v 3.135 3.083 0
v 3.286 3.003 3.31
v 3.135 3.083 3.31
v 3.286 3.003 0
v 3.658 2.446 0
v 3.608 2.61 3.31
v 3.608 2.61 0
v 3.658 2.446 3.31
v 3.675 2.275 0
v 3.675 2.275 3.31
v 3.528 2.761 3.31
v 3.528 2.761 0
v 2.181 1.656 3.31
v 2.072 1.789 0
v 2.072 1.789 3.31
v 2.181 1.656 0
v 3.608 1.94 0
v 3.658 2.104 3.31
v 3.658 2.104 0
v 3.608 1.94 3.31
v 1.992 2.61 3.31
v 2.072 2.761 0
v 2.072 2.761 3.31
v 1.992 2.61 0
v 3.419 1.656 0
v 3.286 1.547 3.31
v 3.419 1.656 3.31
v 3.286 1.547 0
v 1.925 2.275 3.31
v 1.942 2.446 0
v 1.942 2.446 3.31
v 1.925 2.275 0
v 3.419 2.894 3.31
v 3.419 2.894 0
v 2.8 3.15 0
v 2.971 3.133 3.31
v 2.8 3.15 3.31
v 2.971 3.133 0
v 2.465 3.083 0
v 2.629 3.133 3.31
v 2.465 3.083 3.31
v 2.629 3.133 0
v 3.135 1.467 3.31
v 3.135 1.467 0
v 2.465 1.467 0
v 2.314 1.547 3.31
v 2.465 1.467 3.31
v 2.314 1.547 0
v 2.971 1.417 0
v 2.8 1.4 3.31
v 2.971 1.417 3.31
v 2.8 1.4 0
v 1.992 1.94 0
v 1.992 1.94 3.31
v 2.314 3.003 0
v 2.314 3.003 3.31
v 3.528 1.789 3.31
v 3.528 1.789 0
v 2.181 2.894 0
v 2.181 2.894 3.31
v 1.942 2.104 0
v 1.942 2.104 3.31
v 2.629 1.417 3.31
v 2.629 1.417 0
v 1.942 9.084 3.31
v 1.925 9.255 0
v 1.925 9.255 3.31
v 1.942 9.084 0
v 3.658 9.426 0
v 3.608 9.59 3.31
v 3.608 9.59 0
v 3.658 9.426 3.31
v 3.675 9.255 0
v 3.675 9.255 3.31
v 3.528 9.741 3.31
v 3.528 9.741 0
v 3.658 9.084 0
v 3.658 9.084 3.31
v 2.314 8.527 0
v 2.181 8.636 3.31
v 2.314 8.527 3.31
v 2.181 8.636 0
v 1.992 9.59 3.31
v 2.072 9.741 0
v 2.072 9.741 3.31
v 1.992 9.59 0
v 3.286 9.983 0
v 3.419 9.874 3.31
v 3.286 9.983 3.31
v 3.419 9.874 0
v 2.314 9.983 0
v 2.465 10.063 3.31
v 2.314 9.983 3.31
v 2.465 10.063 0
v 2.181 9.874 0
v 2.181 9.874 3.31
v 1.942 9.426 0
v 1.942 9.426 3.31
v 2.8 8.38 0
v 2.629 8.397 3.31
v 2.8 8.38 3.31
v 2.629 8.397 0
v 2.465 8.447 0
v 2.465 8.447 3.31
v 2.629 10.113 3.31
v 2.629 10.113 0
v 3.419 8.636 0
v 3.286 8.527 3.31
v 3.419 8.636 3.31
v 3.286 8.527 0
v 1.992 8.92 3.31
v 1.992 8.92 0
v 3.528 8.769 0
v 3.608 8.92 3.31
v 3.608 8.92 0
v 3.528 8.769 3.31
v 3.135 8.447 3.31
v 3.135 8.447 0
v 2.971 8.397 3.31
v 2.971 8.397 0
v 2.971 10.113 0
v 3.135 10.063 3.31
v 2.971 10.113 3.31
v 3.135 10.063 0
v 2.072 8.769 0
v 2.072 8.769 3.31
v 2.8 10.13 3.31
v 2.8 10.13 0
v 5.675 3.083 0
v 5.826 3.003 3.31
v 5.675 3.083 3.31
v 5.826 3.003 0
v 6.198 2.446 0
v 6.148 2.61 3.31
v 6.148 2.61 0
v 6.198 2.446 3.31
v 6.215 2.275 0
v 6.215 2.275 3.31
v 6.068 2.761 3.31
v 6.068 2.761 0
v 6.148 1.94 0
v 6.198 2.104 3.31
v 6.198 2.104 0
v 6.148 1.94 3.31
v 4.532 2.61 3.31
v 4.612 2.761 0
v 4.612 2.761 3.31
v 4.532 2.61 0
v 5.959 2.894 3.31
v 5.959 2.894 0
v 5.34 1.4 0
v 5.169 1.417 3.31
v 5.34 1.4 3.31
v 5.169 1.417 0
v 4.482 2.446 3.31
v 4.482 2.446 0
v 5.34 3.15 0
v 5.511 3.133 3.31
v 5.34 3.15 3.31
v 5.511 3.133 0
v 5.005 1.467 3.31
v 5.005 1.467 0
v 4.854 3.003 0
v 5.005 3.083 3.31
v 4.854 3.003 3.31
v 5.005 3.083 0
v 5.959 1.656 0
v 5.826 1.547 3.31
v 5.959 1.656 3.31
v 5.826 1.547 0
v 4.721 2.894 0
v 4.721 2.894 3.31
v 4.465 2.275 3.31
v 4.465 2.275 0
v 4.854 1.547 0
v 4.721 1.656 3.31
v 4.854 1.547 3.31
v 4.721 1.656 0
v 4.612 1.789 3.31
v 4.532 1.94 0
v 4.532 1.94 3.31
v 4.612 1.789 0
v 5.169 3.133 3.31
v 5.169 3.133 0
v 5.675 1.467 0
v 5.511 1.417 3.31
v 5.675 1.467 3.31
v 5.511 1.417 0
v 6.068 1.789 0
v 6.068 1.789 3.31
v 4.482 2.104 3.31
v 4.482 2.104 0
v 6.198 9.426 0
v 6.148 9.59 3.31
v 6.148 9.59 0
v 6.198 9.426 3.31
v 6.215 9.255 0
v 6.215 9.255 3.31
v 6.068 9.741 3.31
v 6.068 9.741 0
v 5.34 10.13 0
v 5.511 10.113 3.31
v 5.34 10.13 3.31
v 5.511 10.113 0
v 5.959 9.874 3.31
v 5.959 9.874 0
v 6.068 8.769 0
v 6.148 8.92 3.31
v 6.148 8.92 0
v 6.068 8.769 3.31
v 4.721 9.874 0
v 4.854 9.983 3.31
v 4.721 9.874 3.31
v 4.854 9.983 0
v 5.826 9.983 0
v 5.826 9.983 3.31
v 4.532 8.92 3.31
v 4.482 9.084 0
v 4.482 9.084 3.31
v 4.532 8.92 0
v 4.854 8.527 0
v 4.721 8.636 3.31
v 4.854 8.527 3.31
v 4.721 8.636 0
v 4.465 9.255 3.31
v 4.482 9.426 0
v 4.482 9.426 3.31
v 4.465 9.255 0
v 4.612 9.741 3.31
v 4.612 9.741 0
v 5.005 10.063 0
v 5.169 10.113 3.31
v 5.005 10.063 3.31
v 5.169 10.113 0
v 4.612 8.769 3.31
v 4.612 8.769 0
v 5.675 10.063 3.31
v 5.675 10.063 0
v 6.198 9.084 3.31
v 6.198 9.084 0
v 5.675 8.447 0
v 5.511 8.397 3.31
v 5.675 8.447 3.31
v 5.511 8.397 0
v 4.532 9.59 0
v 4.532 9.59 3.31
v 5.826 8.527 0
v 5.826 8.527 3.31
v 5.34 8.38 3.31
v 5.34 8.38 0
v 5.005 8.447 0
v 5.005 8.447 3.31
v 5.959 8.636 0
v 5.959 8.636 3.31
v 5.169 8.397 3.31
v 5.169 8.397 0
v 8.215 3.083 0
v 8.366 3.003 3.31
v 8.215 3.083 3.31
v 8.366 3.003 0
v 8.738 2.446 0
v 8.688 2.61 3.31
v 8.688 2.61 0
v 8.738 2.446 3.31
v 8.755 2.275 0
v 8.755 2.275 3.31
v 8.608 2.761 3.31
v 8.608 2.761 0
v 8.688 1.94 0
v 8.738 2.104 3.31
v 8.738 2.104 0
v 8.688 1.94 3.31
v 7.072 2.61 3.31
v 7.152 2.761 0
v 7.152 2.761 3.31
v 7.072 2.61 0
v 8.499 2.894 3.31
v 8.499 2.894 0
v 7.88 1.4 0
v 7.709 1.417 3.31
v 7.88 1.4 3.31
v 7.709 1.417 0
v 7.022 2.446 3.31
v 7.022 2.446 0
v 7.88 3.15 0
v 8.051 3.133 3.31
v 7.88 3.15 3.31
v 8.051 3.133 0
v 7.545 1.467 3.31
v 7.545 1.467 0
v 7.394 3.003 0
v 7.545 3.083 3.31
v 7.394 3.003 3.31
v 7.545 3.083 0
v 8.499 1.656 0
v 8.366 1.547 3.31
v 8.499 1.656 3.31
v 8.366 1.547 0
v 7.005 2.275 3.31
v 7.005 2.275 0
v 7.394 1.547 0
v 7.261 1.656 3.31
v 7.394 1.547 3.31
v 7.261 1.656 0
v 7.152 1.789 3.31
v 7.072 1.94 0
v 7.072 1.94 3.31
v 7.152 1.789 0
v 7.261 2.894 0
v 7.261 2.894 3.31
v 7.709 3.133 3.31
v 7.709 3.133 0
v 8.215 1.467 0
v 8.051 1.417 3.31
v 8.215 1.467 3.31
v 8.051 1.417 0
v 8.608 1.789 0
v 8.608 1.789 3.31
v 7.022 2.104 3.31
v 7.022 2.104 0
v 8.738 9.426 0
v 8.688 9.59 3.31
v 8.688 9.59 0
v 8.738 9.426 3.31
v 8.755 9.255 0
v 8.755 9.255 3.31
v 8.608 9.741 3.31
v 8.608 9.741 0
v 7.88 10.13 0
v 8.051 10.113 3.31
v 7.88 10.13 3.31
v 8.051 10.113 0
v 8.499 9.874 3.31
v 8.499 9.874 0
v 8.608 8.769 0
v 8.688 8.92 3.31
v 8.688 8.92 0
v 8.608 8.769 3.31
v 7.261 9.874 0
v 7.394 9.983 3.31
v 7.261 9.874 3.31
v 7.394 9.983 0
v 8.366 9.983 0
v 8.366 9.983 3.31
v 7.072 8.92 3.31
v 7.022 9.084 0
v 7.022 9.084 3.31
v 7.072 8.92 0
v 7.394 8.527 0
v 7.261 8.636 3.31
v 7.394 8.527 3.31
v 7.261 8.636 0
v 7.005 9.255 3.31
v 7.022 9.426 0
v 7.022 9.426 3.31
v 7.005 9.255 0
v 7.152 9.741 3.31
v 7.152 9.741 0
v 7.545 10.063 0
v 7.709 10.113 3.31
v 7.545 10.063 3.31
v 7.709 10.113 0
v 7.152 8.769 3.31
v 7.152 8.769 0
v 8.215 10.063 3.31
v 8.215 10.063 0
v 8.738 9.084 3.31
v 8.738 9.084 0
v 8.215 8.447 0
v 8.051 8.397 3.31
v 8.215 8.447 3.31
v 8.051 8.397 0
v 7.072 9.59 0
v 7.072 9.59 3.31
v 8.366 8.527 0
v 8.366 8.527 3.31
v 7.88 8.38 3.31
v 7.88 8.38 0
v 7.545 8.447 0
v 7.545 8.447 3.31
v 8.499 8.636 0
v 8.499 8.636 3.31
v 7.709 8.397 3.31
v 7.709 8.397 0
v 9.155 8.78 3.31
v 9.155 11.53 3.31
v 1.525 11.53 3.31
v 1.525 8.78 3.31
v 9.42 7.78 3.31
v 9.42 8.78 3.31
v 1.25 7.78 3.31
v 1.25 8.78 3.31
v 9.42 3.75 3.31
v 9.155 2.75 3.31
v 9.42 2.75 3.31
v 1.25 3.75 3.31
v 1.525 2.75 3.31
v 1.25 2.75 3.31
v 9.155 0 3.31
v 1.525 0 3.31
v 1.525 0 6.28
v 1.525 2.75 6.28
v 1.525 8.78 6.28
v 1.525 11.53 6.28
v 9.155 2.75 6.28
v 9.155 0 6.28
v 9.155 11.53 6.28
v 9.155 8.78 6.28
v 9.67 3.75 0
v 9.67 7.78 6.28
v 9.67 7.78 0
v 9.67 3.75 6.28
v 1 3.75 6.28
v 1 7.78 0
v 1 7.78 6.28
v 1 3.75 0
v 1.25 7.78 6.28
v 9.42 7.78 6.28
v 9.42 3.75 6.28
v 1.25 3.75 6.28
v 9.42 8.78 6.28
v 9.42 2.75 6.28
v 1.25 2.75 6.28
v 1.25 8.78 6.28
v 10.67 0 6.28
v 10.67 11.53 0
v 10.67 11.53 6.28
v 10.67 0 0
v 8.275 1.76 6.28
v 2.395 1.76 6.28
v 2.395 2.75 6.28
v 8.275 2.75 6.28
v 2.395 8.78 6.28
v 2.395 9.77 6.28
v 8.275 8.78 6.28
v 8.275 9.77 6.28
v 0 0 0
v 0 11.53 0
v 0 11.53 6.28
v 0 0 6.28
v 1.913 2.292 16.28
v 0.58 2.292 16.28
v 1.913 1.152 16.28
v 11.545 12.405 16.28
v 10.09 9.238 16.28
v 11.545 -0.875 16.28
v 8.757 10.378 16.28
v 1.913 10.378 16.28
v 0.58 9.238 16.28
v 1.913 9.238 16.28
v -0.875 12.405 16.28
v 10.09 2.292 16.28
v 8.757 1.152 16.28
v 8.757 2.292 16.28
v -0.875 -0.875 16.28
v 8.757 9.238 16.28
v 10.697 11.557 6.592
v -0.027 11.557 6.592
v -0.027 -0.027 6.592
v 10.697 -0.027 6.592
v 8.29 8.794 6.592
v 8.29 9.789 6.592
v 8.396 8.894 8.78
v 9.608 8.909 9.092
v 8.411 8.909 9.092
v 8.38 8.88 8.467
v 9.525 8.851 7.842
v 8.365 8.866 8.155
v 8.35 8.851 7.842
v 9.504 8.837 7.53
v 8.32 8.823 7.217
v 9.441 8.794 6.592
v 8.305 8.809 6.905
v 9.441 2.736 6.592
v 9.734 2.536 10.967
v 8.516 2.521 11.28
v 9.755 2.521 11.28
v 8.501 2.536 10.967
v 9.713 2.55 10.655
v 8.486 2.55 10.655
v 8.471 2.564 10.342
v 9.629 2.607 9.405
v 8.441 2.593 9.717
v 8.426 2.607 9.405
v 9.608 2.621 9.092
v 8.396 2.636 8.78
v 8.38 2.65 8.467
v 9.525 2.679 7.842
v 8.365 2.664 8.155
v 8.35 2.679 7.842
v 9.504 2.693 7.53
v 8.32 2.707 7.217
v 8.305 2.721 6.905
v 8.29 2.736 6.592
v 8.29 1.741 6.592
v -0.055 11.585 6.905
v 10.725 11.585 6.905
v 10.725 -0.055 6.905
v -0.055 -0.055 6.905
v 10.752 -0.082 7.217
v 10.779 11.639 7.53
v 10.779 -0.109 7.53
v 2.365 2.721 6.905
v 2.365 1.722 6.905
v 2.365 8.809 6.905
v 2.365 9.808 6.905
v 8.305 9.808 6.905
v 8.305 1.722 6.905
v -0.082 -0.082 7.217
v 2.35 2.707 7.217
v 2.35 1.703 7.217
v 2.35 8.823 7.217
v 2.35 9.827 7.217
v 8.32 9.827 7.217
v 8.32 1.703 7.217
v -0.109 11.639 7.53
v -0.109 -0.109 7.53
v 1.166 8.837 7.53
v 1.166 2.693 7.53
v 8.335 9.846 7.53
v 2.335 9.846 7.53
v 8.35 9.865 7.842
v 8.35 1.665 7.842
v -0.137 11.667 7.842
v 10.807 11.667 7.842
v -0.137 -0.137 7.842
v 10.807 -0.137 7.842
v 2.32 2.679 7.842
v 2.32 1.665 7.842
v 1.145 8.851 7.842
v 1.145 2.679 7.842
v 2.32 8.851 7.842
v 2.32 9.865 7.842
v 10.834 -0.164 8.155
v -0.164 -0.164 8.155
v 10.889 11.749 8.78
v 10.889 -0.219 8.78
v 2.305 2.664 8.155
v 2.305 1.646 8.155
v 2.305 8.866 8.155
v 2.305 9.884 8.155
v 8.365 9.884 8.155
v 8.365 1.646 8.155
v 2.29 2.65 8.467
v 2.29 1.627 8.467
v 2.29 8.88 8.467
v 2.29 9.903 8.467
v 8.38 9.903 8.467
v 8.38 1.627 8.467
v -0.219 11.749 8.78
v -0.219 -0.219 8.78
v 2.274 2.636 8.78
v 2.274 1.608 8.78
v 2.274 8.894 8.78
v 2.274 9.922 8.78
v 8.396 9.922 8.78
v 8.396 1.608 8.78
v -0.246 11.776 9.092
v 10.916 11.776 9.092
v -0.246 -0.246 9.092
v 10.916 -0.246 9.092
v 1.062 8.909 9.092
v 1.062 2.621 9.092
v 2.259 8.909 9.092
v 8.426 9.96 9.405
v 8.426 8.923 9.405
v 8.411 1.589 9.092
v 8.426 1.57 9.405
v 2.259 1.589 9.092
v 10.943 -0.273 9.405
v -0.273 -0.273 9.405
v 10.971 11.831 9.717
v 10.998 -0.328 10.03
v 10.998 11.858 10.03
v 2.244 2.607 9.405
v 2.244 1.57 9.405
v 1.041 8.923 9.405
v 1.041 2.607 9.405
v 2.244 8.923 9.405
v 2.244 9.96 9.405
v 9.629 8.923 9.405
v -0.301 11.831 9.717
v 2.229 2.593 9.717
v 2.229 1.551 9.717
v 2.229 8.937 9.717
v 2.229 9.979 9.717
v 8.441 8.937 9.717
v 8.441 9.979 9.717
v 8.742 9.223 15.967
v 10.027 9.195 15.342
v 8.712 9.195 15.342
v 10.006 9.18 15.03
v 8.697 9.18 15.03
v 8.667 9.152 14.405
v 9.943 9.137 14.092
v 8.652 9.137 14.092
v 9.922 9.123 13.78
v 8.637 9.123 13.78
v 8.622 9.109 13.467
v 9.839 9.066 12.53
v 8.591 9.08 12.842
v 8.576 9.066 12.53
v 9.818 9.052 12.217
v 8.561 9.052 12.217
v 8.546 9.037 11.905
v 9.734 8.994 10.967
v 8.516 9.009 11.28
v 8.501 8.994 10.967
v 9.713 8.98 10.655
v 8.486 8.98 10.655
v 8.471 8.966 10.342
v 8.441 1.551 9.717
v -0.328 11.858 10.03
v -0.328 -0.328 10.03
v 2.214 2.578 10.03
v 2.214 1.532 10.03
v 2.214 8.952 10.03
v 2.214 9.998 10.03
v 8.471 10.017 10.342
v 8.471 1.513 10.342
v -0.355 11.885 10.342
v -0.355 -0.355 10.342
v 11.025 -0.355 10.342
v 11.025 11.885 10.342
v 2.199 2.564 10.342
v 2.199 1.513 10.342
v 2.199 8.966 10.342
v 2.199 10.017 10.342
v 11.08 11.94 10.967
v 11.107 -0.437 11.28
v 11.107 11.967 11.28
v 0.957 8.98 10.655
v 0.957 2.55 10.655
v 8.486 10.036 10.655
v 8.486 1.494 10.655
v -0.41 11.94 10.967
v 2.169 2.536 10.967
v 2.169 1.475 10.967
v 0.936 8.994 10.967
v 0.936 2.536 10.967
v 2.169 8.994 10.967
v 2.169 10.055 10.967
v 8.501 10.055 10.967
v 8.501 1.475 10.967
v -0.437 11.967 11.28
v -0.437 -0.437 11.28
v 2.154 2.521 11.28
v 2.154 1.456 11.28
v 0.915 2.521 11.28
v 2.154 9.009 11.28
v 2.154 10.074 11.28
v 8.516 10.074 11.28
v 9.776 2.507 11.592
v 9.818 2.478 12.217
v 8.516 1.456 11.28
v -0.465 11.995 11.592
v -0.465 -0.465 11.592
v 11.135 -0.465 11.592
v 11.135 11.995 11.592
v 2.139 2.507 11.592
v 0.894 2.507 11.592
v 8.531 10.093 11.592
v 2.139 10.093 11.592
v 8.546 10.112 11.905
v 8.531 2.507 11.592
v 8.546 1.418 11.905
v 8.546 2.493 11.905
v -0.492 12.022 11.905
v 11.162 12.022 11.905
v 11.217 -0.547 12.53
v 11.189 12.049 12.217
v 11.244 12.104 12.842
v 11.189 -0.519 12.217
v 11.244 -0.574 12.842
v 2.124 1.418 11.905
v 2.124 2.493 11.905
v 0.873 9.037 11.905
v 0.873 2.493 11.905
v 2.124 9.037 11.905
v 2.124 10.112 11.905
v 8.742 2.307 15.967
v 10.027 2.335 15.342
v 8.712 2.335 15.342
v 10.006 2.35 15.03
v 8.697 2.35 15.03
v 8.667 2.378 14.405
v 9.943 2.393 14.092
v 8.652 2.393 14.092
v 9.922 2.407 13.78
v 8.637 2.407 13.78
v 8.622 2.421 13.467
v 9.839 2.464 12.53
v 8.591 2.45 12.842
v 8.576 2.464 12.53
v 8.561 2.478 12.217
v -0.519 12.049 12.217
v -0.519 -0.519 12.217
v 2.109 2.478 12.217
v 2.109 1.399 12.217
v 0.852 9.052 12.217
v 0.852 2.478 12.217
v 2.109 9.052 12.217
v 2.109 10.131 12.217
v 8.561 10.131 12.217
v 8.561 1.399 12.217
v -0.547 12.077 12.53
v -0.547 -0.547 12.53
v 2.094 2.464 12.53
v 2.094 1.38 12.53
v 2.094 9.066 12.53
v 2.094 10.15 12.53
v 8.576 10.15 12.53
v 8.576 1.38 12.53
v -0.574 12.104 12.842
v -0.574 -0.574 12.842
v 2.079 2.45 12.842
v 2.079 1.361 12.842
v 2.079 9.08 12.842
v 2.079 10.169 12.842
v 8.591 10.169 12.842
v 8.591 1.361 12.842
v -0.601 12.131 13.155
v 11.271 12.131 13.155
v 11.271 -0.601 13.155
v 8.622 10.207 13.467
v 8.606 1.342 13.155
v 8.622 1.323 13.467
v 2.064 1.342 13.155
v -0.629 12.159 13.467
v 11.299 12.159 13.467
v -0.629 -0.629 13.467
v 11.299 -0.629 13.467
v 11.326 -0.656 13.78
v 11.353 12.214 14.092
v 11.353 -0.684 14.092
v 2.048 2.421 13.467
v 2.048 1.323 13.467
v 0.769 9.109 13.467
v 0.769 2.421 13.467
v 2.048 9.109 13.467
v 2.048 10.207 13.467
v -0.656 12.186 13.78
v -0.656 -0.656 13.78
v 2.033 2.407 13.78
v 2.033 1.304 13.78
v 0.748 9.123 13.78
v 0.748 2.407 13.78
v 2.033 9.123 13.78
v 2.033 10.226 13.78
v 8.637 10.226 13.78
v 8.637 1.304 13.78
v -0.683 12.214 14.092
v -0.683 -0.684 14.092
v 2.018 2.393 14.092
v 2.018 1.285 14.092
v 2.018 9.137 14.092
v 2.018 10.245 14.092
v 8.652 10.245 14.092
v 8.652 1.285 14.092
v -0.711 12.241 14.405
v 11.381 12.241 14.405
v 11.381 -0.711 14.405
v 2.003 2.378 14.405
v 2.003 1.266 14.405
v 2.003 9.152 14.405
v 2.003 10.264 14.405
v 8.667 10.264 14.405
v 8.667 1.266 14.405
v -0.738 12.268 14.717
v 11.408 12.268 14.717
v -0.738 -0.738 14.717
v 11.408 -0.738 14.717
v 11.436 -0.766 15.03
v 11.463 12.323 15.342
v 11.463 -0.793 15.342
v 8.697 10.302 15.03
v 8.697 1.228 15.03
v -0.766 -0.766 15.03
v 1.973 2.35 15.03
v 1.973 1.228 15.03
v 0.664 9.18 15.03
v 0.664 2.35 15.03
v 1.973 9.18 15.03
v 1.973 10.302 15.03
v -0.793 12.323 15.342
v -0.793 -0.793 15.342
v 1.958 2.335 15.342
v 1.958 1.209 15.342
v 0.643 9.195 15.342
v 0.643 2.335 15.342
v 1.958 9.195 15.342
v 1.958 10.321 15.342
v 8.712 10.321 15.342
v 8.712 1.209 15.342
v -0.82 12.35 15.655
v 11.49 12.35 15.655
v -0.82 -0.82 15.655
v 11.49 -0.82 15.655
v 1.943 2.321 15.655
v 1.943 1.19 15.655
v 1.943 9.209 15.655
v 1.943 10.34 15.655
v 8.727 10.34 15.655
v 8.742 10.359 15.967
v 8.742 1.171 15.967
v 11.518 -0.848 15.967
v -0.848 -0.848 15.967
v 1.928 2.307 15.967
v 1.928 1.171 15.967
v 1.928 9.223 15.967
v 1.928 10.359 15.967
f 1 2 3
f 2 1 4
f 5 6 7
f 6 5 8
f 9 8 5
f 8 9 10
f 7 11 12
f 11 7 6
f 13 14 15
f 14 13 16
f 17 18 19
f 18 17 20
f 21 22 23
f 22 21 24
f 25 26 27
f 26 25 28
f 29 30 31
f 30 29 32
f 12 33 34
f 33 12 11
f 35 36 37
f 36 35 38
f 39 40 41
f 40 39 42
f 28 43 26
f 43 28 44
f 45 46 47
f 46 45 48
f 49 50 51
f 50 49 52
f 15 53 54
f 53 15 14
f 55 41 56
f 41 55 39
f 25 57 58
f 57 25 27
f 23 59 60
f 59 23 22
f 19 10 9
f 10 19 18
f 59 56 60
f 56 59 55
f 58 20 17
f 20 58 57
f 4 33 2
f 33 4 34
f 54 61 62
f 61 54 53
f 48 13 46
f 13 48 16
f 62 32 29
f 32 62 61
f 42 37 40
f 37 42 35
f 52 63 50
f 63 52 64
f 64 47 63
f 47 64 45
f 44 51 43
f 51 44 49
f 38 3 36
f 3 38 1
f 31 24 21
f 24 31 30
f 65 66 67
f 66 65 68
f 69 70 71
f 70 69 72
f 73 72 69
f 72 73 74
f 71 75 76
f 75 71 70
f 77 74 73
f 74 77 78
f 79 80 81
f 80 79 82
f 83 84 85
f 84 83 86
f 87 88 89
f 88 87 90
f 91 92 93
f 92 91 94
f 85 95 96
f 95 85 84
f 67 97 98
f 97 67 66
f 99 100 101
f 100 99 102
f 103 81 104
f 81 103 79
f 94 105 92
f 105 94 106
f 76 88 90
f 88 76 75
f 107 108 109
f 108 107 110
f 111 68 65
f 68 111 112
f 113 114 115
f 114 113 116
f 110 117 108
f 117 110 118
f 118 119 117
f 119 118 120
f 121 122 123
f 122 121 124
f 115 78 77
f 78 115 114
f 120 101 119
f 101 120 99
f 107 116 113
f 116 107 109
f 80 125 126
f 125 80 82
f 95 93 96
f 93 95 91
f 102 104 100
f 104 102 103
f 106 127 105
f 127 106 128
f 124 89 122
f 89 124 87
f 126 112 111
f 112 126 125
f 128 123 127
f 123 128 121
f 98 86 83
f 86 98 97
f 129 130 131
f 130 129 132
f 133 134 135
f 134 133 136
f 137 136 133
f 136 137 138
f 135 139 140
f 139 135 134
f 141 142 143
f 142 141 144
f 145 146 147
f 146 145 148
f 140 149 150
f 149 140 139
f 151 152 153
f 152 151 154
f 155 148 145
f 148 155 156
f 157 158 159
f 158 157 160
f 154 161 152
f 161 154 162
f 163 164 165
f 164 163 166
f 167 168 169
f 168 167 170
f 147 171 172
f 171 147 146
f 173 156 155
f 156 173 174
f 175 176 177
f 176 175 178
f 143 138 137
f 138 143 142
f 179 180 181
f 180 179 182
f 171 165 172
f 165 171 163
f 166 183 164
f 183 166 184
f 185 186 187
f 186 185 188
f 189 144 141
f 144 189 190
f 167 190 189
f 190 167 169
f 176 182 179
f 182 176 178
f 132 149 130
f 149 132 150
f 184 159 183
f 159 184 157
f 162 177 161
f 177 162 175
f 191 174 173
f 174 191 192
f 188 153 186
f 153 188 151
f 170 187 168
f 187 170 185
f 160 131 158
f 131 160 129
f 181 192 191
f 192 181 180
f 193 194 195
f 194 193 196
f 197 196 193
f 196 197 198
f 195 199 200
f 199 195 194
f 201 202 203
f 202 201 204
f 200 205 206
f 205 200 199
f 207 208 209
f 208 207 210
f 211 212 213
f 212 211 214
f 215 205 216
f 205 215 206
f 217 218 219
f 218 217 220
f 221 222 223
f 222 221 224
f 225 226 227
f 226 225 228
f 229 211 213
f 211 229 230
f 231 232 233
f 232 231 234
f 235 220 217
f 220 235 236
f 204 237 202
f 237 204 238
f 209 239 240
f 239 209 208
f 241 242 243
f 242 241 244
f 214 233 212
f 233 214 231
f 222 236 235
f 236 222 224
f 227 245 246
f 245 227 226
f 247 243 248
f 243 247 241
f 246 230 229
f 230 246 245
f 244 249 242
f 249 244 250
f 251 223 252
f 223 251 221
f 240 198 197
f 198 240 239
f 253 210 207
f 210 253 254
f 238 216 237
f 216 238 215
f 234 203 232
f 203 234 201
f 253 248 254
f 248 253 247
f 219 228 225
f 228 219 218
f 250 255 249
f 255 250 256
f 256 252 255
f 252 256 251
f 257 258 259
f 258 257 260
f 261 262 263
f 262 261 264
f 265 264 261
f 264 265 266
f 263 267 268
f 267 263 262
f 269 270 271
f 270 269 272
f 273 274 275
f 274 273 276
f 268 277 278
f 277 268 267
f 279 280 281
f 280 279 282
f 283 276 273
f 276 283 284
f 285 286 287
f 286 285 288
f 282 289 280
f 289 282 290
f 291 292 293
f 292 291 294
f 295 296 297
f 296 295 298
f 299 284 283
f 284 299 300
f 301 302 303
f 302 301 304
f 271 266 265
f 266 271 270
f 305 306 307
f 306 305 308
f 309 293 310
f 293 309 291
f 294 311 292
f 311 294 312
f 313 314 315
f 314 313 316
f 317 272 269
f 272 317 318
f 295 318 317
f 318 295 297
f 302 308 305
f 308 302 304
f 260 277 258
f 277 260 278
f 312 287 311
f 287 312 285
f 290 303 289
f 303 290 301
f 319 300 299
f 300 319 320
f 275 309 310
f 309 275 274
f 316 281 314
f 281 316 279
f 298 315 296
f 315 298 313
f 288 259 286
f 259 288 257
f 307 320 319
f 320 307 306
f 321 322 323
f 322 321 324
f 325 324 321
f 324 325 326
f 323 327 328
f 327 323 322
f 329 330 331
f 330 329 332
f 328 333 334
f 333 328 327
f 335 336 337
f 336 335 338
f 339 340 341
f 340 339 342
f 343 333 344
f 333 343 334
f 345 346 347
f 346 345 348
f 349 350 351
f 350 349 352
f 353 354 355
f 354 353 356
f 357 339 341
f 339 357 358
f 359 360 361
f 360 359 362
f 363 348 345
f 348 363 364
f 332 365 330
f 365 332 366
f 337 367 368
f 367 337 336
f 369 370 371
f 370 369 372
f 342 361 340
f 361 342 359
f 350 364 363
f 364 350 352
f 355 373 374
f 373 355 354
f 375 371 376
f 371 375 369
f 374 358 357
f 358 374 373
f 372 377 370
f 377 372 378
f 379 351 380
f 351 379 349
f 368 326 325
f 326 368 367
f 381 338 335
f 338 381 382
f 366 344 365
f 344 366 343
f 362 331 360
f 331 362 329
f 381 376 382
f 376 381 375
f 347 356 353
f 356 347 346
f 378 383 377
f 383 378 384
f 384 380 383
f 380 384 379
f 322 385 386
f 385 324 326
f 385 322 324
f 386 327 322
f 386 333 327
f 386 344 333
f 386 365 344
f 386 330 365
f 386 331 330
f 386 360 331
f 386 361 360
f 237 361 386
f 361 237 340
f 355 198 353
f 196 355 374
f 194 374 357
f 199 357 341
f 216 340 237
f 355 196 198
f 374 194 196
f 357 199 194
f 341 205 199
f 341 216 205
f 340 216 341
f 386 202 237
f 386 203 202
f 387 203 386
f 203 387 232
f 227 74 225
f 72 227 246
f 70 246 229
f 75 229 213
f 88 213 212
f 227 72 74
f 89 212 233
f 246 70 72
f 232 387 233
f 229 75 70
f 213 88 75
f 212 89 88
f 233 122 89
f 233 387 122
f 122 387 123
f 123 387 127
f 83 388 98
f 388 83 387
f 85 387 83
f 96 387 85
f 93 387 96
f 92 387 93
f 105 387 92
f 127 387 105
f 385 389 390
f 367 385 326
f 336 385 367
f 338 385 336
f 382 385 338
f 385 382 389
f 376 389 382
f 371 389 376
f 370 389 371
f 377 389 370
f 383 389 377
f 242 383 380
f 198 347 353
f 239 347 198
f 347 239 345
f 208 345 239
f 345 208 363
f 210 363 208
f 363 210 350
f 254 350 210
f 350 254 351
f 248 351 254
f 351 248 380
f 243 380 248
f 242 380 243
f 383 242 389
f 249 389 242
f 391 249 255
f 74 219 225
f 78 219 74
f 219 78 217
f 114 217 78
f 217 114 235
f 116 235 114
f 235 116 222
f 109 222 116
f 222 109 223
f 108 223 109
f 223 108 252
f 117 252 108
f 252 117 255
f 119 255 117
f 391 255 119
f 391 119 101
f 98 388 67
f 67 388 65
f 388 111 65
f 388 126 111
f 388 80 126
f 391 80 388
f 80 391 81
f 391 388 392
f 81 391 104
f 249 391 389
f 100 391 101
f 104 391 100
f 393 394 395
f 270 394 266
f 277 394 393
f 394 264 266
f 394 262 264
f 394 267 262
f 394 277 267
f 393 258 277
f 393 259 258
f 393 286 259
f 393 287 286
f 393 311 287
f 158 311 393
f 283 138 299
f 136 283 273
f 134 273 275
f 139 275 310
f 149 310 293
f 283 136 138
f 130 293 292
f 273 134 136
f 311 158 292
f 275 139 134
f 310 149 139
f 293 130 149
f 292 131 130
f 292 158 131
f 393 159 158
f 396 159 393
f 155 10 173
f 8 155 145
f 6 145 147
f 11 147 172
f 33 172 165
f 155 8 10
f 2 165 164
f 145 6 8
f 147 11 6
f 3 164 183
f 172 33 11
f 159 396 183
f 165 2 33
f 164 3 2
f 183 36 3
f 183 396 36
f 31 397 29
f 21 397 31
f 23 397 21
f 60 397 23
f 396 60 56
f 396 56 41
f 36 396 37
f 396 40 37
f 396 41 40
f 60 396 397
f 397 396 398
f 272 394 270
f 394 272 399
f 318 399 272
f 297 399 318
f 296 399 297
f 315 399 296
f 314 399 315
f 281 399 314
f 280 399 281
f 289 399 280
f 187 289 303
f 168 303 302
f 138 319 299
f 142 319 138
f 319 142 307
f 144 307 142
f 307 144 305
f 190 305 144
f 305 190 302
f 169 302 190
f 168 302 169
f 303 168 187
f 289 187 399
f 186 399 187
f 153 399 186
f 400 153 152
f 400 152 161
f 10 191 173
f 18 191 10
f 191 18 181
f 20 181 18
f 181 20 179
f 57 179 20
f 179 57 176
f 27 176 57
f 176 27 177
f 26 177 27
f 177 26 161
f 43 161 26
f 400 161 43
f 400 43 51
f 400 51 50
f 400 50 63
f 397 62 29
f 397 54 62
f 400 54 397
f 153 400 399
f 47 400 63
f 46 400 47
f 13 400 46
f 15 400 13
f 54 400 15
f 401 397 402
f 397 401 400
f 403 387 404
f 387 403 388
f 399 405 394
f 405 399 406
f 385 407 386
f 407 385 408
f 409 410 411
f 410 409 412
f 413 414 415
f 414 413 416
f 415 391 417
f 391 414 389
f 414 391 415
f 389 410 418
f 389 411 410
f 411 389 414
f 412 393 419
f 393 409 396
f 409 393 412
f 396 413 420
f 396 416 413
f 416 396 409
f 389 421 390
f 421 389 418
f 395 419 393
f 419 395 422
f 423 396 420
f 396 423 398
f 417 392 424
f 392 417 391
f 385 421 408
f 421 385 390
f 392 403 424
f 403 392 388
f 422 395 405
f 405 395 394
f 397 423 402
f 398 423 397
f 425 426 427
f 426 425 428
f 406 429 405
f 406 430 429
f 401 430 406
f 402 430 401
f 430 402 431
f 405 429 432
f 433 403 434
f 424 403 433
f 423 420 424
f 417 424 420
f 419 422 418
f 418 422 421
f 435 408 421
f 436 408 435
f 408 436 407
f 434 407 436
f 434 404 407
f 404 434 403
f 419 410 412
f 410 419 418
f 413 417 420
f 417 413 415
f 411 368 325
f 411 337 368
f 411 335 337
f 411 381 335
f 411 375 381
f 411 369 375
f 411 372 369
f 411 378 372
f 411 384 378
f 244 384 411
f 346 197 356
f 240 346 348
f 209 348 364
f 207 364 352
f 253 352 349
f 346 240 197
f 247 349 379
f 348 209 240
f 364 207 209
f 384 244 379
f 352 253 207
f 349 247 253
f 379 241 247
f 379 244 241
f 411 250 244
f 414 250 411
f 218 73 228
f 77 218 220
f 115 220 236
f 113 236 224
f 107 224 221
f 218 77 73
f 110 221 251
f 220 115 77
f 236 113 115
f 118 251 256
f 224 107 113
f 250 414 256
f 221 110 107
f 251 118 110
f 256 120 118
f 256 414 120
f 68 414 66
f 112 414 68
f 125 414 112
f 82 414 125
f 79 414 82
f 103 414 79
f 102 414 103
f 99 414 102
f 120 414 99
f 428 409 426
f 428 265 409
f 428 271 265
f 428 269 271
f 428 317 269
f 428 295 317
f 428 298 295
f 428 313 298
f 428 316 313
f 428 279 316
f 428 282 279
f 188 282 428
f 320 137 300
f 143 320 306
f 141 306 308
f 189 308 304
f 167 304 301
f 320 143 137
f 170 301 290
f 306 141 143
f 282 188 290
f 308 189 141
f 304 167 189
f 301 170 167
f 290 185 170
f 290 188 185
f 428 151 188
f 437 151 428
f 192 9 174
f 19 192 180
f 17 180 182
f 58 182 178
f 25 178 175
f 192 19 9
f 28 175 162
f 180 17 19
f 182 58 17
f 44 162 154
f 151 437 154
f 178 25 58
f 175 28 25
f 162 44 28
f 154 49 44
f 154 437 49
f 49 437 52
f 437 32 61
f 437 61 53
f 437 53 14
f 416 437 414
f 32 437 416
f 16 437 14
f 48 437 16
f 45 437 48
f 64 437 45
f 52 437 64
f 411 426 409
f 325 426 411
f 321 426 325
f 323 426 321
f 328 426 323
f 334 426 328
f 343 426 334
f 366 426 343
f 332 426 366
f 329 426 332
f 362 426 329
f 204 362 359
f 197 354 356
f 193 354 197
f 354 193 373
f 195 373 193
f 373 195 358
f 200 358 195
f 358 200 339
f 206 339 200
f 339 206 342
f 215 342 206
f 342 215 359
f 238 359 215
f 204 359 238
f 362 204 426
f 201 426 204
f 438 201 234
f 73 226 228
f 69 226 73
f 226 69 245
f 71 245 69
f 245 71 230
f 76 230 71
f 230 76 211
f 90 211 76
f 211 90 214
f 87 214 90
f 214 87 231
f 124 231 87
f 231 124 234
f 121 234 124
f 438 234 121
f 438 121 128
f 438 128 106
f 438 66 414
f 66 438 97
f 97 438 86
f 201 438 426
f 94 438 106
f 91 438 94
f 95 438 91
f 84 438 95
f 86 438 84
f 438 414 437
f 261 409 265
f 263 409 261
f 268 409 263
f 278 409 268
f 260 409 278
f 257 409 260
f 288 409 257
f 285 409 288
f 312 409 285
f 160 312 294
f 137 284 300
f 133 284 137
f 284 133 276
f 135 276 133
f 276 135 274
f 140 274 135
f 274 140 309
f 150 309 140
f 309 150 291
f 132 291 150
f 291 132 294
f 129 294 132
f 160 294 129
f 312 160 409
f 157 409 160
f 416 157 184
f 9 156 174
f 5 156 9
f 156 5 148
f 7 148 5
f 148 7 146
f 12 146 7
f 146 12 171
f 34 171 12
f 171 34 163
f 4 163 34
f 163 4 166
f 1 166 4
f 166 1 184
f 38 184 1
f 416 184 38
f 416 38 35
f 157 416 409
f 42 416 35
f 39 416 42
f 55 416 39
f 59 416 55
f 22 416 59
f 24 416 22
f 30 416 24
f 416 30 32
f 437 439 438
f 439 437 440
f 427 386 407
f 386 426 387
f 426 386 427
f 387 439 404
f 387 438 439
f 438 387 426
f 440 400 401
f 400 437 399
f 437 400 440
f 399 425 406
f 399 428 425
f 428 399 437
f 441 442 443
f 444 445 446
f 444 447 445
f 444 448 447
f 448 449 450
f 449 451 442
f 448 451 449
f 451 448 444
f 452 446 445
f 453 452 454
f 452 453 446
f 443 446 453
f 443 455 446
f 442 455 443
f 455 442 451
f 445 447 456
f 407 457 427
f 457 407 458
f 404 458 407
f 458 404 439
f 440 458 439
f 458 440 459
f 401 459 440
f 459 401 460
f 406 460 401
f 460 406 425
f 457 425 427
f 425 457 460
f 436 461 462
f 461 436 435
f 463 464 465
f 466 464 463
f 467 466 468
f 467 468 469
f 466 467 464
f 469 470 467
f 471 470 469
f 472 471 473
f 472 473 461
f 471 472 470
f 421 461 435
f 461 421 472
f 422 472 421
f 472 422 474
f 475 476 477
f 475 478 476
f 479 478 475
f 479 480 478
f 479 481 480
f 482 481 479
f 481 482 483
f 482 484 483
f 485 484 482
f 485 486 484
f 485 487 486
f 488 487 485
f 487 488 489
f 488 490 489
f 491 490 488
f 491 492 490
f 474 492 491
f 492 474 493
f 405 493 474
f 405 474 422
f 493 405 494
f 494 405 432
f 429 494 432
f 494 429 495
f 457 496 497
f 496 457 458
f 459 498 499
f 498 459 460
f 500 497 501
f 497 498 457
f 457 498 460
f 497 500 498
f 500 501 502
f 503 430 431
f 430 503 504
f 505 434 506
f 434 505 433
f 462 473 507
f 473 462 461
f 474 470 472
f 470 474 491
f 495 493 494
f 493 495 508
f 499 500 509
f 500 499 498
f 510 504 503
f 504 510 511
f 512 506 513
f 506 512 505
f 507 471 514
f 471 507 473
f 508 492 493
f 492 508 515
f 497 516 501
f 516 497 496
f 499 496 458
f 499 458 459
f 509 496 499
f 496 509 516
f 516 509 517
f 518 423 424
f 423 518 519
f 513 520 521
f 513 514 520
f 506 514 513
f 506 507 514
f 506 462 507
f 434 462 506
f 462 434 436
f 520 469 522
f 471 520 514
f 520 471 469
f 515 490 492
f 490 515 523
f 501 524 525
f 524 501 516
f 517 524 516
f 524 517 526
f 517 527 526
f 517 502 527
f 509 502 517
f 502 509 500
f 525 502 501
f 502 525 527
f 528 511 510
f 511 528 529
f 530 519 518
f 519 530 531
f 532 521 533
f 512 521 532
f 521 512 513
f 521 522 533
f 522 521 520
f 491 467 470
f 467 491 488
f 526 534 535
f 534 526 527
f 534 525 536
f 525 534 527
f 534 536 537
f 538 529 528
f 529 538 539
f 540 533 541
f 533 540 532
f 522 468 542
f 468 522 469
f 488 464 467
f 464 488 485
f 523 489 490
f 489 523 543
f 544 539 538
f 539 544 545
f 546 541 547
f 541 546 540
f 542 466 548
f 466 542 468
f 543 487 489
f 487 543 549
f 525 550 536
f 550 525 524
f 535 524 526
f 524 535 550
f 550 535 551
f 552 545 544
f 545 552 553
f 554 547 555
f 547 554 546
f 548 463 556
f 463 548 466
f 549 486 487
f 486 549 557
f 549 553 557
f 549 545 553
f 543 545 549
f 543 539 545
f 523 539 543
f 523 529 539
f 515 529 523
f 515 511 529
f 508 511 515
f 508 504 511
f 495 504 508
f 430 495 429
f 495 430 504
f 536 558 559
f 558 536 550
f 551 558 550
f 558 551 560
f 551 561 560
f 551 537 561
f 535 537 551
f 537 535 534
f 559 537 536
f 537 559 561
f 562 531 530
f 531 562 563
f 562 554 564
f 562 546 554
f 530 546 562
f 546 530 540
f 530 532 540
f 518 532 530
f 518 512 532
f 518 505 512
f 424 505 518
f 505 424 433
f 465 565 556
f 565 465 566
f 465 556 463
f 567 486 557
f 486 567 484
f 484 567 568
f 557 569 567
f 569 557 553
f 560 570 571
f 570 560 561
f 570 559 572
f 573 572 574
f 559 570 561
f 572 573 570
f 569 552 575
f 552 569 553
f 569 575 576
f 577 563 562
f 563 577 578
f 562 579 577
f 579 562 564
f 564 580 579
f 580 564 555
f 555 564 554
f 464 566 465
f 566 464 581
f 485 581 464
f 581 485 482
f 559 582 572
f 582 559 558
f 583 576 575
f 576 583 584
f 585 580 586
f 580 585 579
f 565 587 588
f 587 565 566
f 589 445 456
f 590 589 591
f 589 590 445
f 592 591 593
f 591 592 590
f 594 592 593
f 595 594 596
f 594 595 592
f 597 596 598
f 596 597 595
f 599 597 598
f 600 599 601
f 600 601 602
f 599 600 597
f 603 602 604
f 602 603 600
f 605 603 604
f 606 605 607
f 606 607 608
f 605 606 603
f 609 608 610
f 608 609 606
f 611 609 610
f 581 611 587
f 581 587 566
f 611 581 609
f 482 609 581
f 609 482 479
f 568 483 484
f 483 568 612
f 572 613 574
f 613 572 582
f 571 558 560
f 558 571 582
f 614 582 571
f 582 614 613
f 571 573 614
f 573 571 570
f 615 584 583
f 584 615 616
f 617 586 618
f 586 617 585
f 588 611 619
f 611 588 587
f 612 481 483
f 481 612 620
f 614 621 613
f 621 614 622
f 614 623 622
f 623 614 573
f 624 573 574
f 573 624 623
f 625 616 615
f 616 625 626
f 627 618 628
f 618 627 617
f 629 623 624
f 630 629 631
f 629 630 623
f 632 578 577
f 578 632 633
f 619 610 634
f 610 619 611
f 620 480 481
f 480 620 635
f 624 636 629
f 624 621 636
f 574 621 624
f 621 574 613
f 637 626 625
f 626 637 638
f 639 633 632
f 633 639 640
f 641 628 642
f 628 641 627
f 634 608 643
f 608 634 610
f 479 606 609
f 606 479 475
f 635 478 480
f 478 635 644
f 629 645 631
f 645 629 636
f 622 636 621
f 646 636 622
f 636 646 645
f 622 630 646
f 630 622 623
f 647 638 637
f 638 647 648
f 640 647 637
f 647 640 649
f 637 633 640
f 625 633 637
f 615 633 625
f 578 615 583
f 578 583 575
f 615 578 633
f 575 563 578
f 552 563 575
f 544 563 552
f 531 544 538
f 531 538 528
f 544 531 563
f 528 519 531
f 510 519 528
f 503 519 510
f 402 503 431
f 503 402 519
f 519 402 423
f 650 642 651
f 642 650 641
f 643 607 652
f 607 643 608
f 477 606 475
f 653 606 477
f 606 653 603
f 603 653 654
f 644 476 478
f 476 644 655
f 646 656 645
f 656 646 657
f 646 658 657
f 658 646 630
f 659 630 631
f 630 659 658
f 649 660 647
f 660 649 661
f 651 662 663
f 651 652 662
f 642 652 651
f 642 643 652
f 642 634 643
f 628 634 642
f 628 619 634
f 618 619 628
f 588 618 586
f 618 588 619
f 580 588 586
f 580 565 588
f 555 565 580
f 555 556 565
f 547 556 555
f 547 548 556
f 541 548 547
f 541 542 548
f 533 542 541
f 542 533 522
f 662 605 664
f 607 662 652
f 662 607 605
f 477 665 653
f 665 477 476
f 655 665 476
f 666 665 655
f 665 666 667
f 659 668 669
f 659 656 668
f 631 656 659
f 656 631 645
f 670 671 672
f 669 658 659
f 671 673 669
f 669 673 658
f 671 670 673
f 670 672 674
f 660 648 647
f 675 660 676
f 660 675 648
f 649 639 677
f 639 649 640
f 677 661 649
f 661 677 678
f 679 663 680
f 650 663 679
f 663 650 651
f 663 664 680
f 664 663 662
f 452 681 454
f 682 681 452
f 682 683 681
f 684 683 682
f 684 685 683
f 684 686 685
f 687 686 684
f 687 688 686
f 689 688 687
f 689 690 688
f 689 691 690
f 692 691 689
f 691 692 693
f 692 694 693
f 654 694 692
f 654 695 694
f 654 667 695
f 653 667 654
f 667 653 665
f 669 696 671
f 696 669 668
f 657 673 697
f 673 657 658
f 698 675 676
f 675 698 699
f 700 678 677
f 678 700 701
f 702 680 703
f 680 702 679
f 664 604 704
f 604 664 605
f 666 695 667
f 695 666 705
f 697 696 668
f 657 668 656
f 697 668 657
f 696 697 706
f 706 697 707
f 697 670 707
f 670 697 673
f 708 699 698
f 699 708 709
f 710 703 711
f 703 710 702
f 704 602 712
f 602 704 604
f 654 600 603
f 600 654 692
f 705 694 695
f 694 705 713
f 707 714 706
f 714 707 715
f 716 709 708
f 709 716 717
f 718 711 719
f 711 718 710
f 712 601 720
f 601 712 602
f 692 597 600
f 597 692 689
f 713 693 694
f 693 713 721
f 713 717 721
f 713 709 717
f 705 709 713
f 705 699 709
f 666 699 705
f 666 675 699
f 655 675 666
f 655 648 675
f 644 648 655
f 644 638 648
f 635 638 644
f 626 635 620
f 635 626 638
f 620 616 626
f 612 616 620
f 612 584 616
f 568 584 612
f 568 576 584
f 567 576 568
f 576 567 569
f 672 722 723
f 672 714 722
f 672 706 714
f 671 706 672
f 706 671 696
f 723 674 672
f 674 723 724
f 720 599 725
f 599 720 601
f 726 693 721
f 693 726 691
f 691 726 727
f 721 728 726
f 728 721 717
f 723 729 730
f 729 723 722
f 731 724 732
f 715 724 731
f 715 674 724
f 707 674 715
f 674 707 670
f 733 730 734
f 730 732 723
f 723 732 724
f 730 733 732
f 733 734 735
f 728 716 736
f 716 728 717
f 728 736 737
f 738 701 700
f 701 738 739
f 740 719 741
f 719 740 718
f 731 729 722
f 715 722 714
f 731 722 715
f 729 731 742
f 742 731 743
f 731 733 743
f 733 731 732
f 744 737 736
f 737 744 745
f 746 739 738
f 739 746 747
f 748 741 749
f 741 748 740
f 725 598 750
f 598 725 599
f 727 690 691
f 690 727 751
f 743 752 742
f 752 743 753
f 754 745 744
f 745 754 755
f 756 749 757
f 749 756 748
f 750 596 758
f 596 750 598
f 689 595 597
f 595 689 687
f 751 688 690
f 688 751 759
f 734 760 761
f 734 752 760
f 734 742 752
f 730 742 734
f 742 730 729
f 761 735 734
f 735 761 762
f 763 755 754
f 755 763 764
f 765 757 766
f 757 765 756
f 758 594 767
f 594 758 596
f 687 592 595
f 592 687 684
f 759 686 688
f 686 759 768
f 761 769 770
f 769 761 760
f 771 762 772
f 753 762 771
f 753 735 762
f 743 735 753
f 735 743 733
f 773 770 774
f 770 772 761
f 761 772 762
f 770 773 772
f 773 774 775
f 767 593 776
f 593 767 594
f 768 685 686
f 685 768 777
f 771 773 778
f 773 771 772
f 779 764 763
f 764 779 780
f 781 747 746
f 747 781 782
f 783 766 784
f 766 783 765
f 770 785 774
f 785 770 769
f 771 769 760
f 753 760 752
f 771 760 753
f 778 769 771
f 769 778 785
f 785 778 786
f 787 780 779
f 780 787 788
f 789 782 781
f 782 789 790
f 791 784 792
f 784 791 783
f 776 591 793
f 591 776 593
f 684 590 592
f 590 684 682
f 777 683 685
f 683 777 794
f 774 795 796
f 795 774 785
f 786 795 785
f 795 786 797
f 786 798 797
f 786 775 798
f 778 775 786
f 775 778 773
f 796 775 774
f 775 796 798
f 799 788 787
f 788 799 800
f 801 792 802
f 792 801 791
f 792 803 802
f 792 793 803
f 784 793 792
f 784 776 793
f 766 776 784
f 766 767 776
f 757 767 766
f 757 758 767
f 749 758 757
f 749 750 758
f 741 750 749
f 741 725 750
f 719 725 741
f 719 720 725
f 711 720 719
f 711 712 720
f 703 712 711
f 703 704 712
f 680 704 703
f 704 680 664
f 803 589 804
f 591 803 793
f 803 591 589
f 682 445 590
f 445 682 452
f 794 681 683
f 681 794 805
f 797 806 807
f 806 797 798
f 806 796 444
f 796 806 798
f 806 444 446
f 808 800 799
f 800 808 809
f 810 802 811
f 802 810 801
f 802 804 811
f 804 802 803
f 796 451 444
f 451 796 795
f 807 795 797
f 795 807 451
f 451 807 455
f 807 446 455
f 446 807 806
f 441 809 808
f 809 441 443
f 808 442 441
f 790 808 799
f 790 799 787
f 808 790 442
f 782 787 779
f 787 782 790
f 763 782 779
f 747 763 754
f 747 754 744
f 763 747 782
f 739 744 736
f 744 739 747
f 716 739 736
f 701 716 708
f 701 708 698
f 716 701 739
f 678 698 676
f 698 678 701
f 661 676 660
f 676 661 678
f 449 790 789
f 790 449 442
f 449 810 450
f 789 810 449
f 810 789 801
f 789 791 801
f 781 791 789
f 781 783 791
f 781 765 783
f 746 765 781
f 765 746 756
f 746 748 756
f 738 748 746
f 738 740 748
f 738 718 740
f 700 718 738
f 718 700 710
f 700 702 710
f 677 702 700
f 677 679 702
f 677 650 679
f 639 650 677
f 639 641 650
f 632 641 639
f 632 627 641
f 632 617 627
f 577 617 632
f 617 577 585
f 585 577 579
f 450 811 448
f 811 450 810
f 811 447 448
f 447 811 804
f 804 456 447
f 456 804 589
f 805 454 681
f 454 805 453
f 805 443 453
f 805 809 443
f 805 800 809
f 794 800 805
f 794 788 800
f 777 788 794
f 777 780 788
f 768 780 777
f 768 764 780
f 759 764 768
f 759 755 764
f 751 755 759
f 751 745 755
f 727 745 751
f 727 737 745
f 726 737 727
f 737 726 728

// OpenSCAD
//


//----VARIABLES----

//--Transformer Dimensions--

//The length of the transformer body(long side, x axis)
tLength=7.87;

//The width of the transformer body(short side, y axis)
tWidth=5.23;
//Width assigned to depth for interchangeable use in code
tDepth=tWidth;

//The height of the transformer(top to bottom, z axis)
tHeight=5.59;

//The width of the metal legs used for interfacing with the transformer
tpinWidth=0.76;

//The distance from one pin to the consecutive one
pinSpacing=0.75;

//The distance that the pins extrude from the side of the body
pinExtrusion=0.66;


//--Casing Dimensions--

//The depth that the surface that the legs rest on is indented from the top of the main chassis
//-Partially outdated after removal of individual pinslots
pinDepth=3;

//The width of the walls enclosing the transformer
//-Partially outdated after pogo holes added
wallWidth=1;

//--PGP related dimensions--

//Diameter of the main body of the pogo pin(the bit that gets inserted into the hole)
pogoDiameter=1.49;

//Diameter of the hole that the pogo pin is inserted into
pogoHoleDiameter=1.75;

//Length of the main body of the pogo pin, from top of lip to spring
pogoLength=3.3;//length of main body of pin

//where the pogo hole is positioned, 0 is on the outside of the inset, 1 is on the inside of the inset
pogoPositionRatio=0.7;

//The extra radius of the lip compared to the main body
pogoLipRadius=0.1;

//The height of the lip (could be considered the "thickness")
pogoLipHeight=0.5;

//The padding between the edge of a pogo hole and the pin barrier
//-Outdated since slot barriers removed, but still used in code
holePadding=0.76;

//slot on the bottom for protecting the bottom of the pogo pins from damage. set to 0 to disable this, reccommended set to pogostemlength+0.5
//-Not used when PCB's are soldered to board or PCB
pogoProtection=0.00;


//--Funnel--
funnelHeight = 10;
// Using an angle (e.g., 30 degrees) makes the slope constant 
// regardless of height changes.
funnelSlopeAngle = 5; 

// Funnel Derived Logic:
// tan(angle) = opposite / adjacent -> expansion = height * tan(angle)
funnelExpansion = funnelHeight * tan(funnelSlopeAngle);





//--Miscellaneous--
//negligible variable used to avoid Z-fighting
$tol=0.01;

//Resolution of cylinders/circles. Eqivalent to x-sided circle/prism
$fn=32;

//Required clearance between different parts to allow proper movement
//-Calibrated for the printer we used
$clear=0.4;

//==============
//DERIVED VARIABLES
//==============

//STATIC

//Whether or not to include an indent to fit the pogo pin lip
lip=false;

//the number of legs on each side of the transformer
numPins=3;

//Calculated absolute pin positions:
//Middle of each pin can be found with 1.4+2.54*pinNumber starting at pinNumber=0 so:
basePinLoc=[1.4,3.94,6.48];//coordinates on the base trasformer
extraPinOffset=wallWidth+$clear;
pinLoc=[1.4+extraPinOffset,3.94+extraPinOffset,6.48+extraPinOffset];


//top slot width for ensuring proper transformer length fit
topSlotWidth=tWidth+2*$clear;

//offset of the top slot from the origin in the x axis
topSlotOffset=0.5;

//Derived casing dimensions
//inner casing cavity(This is the main cavity in the middle of the chassis)
innerCasingLength=tLength+(2*$clear);
innerCasingWidth=tWidth+(2*$clear)-2;
innerCasingHeight=pogoLength+pogoProtection+pinDepth;

//Outer casing dimensions. Everything else is cut out of this
outerCasingLength=innerCasingLength+2*wallWidth;//Length of outer casing
outerCasingWidth=innerCasingWidth+2*(2*wallWidth+pogoHoleDiameter);//Depth of outer casing
outerCasingHeight=innerCasingHeight-2*$tol;//Height of outer casing

// We calculate scale as: (Original + 2*Expansion) / Original
// This is moved here so the module stays clean
funnelScaleX = (outerCasingLength + 2 * funnelExpansion) / outerCasingLength;
funnelScaleY = (outerCasingWidth + 2 * funnelExpansion) / outerCasingWidth;

//Main code for assembling the chassis

//Subtracting everything from the main block
difference()
{//Block defined by outer casing vars to subtract everything from
    
    cube([outerCasingLength,//Length of outer casing 
        outerCasingWidth, //Depth of outer casing
        outerCasingHeight]);//Height of outer casing
    
        echo(outerCasingHeight)//debugging
    
//Everything below this point is grouped then subtracted from the main block

{
//inner cube acting as main central cavity
    
//moving cube to correct position
translate([
    (outerCasingLength)/2-innerCasingLength/2,
    outerCasingWidth/2-innerCasingWidth/2,
    -$tol])
   //Creating cuboid
    cube([
    innerCasingLength,
    innerCasingWidth, 
    innerCasingHeight]);
    
//creating topslot for proper transformer fit
    translate([wallWidth+topSlotOffset/2,
    outerCasingWidth/2-topSlotWidth/2,
    outerCasingHeight-pinDepth+$tol*3])
    //creating topslot cuboid
    cube([innerCasingLength-topSlotOffset,
    topSlotWidth,
    pinDepth+$tol]);
    
//Looping through each pin pair
for (i = [0:(numPins-1)]){
    pinInset(i); //Create a pin inset for this pair
    pogoHoles(i,lip);}//Create pogo holes for this pair
}

}


//Abstracted modules from the main difference function

//Originally used to create pinslots for each pogo pin
//-Having been widened, there are no longer slots but the logic still works so is still in place
module pinInset(pinNum){
//define values for dimensions of the bars hollowing out the pin inset pair
width=pogoDiameter+pogoLipRadius*2+holePadding+0.1;
depth=outerCasingWidth+2*$tol;
height=pinDepth;

//bottominset(Pogo protection, not used when soldering to board or pcb)
translate([pinLoc[pinNum],
    (depth/2)-$tol,
    (height/2)-$tol])
    
    cube([width,
    depth,
    pogoProtection],center=true);
//topinset
translate([pinLoc[pinNum],
    (depth/2)-$tol,
    pogoLength+pogoProtection+height+$tol-height/2])
    
    cube([width,
    depth,
    height],
    center=true);
    }
    
//Creating holes for the pogo pins
//Takes params:
    //pinNum(int) 0->2 for which pin the holes are being made for
    //includeLip(bool) whether or not to include an indent in the bottom to fit the lip
module pogoHoles(pinNum,includeLip){
    
    pinInsetWidth=pogoDiameter+pogoLipRadius*2+holePadding;
    radius=pogoHoleDiameter/2;
    height=5*outerCasingHeight;//arbitrary amount more than the outer transformer casing to make sure the hole goes all the way through
    
    
    translate([
    pinLoc[pinNum],
    (radius+wallWidth*2*pogoPositionRatio),
    height/2-$tol]){
        cylinder(h=height,r=radius,center=true);
    
    if(includeLip){
        translate([
        0,
        0,
        -(height/2)+pogoProtection])
        
            cylinder(h=pogoLipHeight,r=pogoLipRadius,center=true);
        }}
    
    translate([pinLoc[pinNum],outerCasingWidth-(radius+wallWidth*2*pogoPositionRatio),height/2-$tol]){
        cylinder(h=height,r=radius,center=true);
        if(includeLip){
        translate([0,0,-(height/2)+pogoProtection])
            cylinder(h=pogoLipHeight,r=pogoLipRadius+pogoDiameter/2,center=true);
        }}}

module funnel(){
    pinGapStart = pinLoc[0] - $clear;
    pinGapEnd = pinLoc[2] + $clear;
    funnelPinGapLength = pinGapEnd - pinGapStart;
        
    translate([outerCasingLength/2, outerCasingWidth/2, outerCasingHeight])
    // Uses the pre-calculated vector scale from the declarations
    linear_extrude(height = funnelHeight, scale = [funnelScaleX, funnelScaleY])
    {
        difference(){
            square([outerCasingLength, outerCasingWidth], center = true);
            
            union() {
                square([innerCasingLength - topSlotOffset, topSlotWidth], center = true);
                square([funnelPinGapLength, pinExtrusion + tWidth + 2 * pinExtrusion + 2 * $clear], center = true);
            }
        }    
    }
}
funnel();
